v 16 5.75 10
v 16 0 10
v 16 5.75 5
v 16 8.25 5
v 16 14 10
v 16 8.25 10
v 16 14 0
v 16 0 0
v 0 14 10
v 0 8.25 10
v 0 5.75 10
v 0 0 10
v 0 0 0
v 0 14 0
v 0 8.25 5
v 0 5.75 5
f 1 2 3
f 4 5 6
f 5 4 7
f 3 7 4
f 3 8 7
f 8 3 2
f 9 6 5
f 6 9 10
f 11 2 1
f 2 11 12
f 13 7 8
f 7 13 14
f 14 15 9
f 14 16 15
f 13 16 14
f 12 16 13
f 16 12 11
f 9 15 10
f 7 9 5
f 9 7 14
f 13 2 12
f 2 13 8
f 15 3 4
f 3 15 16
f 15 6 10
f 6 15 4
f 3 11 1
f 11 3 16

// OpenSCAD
$fn = 32;

// ----------------------------------------------------------------------
// Micro clip: slotted block, 5-20 mm class
// ----------------------------------------------------------------------

// --- parameters (mm) ---
block_l = 16;             // block length, X
block_w = 14;             // block width, Y
block_h = 10;             // block height, Z
slot_w = 2.5;             // slot width
slot_d = 5;               // slot depth from the top

difference() {
  cube([block_l, block_w, block_h]);
  translate([-1, block_w / 2 - slot_w / 2, block_h - slot_d])
    cube([block_l + 2, slot_w, slot_d + 1]);
}
